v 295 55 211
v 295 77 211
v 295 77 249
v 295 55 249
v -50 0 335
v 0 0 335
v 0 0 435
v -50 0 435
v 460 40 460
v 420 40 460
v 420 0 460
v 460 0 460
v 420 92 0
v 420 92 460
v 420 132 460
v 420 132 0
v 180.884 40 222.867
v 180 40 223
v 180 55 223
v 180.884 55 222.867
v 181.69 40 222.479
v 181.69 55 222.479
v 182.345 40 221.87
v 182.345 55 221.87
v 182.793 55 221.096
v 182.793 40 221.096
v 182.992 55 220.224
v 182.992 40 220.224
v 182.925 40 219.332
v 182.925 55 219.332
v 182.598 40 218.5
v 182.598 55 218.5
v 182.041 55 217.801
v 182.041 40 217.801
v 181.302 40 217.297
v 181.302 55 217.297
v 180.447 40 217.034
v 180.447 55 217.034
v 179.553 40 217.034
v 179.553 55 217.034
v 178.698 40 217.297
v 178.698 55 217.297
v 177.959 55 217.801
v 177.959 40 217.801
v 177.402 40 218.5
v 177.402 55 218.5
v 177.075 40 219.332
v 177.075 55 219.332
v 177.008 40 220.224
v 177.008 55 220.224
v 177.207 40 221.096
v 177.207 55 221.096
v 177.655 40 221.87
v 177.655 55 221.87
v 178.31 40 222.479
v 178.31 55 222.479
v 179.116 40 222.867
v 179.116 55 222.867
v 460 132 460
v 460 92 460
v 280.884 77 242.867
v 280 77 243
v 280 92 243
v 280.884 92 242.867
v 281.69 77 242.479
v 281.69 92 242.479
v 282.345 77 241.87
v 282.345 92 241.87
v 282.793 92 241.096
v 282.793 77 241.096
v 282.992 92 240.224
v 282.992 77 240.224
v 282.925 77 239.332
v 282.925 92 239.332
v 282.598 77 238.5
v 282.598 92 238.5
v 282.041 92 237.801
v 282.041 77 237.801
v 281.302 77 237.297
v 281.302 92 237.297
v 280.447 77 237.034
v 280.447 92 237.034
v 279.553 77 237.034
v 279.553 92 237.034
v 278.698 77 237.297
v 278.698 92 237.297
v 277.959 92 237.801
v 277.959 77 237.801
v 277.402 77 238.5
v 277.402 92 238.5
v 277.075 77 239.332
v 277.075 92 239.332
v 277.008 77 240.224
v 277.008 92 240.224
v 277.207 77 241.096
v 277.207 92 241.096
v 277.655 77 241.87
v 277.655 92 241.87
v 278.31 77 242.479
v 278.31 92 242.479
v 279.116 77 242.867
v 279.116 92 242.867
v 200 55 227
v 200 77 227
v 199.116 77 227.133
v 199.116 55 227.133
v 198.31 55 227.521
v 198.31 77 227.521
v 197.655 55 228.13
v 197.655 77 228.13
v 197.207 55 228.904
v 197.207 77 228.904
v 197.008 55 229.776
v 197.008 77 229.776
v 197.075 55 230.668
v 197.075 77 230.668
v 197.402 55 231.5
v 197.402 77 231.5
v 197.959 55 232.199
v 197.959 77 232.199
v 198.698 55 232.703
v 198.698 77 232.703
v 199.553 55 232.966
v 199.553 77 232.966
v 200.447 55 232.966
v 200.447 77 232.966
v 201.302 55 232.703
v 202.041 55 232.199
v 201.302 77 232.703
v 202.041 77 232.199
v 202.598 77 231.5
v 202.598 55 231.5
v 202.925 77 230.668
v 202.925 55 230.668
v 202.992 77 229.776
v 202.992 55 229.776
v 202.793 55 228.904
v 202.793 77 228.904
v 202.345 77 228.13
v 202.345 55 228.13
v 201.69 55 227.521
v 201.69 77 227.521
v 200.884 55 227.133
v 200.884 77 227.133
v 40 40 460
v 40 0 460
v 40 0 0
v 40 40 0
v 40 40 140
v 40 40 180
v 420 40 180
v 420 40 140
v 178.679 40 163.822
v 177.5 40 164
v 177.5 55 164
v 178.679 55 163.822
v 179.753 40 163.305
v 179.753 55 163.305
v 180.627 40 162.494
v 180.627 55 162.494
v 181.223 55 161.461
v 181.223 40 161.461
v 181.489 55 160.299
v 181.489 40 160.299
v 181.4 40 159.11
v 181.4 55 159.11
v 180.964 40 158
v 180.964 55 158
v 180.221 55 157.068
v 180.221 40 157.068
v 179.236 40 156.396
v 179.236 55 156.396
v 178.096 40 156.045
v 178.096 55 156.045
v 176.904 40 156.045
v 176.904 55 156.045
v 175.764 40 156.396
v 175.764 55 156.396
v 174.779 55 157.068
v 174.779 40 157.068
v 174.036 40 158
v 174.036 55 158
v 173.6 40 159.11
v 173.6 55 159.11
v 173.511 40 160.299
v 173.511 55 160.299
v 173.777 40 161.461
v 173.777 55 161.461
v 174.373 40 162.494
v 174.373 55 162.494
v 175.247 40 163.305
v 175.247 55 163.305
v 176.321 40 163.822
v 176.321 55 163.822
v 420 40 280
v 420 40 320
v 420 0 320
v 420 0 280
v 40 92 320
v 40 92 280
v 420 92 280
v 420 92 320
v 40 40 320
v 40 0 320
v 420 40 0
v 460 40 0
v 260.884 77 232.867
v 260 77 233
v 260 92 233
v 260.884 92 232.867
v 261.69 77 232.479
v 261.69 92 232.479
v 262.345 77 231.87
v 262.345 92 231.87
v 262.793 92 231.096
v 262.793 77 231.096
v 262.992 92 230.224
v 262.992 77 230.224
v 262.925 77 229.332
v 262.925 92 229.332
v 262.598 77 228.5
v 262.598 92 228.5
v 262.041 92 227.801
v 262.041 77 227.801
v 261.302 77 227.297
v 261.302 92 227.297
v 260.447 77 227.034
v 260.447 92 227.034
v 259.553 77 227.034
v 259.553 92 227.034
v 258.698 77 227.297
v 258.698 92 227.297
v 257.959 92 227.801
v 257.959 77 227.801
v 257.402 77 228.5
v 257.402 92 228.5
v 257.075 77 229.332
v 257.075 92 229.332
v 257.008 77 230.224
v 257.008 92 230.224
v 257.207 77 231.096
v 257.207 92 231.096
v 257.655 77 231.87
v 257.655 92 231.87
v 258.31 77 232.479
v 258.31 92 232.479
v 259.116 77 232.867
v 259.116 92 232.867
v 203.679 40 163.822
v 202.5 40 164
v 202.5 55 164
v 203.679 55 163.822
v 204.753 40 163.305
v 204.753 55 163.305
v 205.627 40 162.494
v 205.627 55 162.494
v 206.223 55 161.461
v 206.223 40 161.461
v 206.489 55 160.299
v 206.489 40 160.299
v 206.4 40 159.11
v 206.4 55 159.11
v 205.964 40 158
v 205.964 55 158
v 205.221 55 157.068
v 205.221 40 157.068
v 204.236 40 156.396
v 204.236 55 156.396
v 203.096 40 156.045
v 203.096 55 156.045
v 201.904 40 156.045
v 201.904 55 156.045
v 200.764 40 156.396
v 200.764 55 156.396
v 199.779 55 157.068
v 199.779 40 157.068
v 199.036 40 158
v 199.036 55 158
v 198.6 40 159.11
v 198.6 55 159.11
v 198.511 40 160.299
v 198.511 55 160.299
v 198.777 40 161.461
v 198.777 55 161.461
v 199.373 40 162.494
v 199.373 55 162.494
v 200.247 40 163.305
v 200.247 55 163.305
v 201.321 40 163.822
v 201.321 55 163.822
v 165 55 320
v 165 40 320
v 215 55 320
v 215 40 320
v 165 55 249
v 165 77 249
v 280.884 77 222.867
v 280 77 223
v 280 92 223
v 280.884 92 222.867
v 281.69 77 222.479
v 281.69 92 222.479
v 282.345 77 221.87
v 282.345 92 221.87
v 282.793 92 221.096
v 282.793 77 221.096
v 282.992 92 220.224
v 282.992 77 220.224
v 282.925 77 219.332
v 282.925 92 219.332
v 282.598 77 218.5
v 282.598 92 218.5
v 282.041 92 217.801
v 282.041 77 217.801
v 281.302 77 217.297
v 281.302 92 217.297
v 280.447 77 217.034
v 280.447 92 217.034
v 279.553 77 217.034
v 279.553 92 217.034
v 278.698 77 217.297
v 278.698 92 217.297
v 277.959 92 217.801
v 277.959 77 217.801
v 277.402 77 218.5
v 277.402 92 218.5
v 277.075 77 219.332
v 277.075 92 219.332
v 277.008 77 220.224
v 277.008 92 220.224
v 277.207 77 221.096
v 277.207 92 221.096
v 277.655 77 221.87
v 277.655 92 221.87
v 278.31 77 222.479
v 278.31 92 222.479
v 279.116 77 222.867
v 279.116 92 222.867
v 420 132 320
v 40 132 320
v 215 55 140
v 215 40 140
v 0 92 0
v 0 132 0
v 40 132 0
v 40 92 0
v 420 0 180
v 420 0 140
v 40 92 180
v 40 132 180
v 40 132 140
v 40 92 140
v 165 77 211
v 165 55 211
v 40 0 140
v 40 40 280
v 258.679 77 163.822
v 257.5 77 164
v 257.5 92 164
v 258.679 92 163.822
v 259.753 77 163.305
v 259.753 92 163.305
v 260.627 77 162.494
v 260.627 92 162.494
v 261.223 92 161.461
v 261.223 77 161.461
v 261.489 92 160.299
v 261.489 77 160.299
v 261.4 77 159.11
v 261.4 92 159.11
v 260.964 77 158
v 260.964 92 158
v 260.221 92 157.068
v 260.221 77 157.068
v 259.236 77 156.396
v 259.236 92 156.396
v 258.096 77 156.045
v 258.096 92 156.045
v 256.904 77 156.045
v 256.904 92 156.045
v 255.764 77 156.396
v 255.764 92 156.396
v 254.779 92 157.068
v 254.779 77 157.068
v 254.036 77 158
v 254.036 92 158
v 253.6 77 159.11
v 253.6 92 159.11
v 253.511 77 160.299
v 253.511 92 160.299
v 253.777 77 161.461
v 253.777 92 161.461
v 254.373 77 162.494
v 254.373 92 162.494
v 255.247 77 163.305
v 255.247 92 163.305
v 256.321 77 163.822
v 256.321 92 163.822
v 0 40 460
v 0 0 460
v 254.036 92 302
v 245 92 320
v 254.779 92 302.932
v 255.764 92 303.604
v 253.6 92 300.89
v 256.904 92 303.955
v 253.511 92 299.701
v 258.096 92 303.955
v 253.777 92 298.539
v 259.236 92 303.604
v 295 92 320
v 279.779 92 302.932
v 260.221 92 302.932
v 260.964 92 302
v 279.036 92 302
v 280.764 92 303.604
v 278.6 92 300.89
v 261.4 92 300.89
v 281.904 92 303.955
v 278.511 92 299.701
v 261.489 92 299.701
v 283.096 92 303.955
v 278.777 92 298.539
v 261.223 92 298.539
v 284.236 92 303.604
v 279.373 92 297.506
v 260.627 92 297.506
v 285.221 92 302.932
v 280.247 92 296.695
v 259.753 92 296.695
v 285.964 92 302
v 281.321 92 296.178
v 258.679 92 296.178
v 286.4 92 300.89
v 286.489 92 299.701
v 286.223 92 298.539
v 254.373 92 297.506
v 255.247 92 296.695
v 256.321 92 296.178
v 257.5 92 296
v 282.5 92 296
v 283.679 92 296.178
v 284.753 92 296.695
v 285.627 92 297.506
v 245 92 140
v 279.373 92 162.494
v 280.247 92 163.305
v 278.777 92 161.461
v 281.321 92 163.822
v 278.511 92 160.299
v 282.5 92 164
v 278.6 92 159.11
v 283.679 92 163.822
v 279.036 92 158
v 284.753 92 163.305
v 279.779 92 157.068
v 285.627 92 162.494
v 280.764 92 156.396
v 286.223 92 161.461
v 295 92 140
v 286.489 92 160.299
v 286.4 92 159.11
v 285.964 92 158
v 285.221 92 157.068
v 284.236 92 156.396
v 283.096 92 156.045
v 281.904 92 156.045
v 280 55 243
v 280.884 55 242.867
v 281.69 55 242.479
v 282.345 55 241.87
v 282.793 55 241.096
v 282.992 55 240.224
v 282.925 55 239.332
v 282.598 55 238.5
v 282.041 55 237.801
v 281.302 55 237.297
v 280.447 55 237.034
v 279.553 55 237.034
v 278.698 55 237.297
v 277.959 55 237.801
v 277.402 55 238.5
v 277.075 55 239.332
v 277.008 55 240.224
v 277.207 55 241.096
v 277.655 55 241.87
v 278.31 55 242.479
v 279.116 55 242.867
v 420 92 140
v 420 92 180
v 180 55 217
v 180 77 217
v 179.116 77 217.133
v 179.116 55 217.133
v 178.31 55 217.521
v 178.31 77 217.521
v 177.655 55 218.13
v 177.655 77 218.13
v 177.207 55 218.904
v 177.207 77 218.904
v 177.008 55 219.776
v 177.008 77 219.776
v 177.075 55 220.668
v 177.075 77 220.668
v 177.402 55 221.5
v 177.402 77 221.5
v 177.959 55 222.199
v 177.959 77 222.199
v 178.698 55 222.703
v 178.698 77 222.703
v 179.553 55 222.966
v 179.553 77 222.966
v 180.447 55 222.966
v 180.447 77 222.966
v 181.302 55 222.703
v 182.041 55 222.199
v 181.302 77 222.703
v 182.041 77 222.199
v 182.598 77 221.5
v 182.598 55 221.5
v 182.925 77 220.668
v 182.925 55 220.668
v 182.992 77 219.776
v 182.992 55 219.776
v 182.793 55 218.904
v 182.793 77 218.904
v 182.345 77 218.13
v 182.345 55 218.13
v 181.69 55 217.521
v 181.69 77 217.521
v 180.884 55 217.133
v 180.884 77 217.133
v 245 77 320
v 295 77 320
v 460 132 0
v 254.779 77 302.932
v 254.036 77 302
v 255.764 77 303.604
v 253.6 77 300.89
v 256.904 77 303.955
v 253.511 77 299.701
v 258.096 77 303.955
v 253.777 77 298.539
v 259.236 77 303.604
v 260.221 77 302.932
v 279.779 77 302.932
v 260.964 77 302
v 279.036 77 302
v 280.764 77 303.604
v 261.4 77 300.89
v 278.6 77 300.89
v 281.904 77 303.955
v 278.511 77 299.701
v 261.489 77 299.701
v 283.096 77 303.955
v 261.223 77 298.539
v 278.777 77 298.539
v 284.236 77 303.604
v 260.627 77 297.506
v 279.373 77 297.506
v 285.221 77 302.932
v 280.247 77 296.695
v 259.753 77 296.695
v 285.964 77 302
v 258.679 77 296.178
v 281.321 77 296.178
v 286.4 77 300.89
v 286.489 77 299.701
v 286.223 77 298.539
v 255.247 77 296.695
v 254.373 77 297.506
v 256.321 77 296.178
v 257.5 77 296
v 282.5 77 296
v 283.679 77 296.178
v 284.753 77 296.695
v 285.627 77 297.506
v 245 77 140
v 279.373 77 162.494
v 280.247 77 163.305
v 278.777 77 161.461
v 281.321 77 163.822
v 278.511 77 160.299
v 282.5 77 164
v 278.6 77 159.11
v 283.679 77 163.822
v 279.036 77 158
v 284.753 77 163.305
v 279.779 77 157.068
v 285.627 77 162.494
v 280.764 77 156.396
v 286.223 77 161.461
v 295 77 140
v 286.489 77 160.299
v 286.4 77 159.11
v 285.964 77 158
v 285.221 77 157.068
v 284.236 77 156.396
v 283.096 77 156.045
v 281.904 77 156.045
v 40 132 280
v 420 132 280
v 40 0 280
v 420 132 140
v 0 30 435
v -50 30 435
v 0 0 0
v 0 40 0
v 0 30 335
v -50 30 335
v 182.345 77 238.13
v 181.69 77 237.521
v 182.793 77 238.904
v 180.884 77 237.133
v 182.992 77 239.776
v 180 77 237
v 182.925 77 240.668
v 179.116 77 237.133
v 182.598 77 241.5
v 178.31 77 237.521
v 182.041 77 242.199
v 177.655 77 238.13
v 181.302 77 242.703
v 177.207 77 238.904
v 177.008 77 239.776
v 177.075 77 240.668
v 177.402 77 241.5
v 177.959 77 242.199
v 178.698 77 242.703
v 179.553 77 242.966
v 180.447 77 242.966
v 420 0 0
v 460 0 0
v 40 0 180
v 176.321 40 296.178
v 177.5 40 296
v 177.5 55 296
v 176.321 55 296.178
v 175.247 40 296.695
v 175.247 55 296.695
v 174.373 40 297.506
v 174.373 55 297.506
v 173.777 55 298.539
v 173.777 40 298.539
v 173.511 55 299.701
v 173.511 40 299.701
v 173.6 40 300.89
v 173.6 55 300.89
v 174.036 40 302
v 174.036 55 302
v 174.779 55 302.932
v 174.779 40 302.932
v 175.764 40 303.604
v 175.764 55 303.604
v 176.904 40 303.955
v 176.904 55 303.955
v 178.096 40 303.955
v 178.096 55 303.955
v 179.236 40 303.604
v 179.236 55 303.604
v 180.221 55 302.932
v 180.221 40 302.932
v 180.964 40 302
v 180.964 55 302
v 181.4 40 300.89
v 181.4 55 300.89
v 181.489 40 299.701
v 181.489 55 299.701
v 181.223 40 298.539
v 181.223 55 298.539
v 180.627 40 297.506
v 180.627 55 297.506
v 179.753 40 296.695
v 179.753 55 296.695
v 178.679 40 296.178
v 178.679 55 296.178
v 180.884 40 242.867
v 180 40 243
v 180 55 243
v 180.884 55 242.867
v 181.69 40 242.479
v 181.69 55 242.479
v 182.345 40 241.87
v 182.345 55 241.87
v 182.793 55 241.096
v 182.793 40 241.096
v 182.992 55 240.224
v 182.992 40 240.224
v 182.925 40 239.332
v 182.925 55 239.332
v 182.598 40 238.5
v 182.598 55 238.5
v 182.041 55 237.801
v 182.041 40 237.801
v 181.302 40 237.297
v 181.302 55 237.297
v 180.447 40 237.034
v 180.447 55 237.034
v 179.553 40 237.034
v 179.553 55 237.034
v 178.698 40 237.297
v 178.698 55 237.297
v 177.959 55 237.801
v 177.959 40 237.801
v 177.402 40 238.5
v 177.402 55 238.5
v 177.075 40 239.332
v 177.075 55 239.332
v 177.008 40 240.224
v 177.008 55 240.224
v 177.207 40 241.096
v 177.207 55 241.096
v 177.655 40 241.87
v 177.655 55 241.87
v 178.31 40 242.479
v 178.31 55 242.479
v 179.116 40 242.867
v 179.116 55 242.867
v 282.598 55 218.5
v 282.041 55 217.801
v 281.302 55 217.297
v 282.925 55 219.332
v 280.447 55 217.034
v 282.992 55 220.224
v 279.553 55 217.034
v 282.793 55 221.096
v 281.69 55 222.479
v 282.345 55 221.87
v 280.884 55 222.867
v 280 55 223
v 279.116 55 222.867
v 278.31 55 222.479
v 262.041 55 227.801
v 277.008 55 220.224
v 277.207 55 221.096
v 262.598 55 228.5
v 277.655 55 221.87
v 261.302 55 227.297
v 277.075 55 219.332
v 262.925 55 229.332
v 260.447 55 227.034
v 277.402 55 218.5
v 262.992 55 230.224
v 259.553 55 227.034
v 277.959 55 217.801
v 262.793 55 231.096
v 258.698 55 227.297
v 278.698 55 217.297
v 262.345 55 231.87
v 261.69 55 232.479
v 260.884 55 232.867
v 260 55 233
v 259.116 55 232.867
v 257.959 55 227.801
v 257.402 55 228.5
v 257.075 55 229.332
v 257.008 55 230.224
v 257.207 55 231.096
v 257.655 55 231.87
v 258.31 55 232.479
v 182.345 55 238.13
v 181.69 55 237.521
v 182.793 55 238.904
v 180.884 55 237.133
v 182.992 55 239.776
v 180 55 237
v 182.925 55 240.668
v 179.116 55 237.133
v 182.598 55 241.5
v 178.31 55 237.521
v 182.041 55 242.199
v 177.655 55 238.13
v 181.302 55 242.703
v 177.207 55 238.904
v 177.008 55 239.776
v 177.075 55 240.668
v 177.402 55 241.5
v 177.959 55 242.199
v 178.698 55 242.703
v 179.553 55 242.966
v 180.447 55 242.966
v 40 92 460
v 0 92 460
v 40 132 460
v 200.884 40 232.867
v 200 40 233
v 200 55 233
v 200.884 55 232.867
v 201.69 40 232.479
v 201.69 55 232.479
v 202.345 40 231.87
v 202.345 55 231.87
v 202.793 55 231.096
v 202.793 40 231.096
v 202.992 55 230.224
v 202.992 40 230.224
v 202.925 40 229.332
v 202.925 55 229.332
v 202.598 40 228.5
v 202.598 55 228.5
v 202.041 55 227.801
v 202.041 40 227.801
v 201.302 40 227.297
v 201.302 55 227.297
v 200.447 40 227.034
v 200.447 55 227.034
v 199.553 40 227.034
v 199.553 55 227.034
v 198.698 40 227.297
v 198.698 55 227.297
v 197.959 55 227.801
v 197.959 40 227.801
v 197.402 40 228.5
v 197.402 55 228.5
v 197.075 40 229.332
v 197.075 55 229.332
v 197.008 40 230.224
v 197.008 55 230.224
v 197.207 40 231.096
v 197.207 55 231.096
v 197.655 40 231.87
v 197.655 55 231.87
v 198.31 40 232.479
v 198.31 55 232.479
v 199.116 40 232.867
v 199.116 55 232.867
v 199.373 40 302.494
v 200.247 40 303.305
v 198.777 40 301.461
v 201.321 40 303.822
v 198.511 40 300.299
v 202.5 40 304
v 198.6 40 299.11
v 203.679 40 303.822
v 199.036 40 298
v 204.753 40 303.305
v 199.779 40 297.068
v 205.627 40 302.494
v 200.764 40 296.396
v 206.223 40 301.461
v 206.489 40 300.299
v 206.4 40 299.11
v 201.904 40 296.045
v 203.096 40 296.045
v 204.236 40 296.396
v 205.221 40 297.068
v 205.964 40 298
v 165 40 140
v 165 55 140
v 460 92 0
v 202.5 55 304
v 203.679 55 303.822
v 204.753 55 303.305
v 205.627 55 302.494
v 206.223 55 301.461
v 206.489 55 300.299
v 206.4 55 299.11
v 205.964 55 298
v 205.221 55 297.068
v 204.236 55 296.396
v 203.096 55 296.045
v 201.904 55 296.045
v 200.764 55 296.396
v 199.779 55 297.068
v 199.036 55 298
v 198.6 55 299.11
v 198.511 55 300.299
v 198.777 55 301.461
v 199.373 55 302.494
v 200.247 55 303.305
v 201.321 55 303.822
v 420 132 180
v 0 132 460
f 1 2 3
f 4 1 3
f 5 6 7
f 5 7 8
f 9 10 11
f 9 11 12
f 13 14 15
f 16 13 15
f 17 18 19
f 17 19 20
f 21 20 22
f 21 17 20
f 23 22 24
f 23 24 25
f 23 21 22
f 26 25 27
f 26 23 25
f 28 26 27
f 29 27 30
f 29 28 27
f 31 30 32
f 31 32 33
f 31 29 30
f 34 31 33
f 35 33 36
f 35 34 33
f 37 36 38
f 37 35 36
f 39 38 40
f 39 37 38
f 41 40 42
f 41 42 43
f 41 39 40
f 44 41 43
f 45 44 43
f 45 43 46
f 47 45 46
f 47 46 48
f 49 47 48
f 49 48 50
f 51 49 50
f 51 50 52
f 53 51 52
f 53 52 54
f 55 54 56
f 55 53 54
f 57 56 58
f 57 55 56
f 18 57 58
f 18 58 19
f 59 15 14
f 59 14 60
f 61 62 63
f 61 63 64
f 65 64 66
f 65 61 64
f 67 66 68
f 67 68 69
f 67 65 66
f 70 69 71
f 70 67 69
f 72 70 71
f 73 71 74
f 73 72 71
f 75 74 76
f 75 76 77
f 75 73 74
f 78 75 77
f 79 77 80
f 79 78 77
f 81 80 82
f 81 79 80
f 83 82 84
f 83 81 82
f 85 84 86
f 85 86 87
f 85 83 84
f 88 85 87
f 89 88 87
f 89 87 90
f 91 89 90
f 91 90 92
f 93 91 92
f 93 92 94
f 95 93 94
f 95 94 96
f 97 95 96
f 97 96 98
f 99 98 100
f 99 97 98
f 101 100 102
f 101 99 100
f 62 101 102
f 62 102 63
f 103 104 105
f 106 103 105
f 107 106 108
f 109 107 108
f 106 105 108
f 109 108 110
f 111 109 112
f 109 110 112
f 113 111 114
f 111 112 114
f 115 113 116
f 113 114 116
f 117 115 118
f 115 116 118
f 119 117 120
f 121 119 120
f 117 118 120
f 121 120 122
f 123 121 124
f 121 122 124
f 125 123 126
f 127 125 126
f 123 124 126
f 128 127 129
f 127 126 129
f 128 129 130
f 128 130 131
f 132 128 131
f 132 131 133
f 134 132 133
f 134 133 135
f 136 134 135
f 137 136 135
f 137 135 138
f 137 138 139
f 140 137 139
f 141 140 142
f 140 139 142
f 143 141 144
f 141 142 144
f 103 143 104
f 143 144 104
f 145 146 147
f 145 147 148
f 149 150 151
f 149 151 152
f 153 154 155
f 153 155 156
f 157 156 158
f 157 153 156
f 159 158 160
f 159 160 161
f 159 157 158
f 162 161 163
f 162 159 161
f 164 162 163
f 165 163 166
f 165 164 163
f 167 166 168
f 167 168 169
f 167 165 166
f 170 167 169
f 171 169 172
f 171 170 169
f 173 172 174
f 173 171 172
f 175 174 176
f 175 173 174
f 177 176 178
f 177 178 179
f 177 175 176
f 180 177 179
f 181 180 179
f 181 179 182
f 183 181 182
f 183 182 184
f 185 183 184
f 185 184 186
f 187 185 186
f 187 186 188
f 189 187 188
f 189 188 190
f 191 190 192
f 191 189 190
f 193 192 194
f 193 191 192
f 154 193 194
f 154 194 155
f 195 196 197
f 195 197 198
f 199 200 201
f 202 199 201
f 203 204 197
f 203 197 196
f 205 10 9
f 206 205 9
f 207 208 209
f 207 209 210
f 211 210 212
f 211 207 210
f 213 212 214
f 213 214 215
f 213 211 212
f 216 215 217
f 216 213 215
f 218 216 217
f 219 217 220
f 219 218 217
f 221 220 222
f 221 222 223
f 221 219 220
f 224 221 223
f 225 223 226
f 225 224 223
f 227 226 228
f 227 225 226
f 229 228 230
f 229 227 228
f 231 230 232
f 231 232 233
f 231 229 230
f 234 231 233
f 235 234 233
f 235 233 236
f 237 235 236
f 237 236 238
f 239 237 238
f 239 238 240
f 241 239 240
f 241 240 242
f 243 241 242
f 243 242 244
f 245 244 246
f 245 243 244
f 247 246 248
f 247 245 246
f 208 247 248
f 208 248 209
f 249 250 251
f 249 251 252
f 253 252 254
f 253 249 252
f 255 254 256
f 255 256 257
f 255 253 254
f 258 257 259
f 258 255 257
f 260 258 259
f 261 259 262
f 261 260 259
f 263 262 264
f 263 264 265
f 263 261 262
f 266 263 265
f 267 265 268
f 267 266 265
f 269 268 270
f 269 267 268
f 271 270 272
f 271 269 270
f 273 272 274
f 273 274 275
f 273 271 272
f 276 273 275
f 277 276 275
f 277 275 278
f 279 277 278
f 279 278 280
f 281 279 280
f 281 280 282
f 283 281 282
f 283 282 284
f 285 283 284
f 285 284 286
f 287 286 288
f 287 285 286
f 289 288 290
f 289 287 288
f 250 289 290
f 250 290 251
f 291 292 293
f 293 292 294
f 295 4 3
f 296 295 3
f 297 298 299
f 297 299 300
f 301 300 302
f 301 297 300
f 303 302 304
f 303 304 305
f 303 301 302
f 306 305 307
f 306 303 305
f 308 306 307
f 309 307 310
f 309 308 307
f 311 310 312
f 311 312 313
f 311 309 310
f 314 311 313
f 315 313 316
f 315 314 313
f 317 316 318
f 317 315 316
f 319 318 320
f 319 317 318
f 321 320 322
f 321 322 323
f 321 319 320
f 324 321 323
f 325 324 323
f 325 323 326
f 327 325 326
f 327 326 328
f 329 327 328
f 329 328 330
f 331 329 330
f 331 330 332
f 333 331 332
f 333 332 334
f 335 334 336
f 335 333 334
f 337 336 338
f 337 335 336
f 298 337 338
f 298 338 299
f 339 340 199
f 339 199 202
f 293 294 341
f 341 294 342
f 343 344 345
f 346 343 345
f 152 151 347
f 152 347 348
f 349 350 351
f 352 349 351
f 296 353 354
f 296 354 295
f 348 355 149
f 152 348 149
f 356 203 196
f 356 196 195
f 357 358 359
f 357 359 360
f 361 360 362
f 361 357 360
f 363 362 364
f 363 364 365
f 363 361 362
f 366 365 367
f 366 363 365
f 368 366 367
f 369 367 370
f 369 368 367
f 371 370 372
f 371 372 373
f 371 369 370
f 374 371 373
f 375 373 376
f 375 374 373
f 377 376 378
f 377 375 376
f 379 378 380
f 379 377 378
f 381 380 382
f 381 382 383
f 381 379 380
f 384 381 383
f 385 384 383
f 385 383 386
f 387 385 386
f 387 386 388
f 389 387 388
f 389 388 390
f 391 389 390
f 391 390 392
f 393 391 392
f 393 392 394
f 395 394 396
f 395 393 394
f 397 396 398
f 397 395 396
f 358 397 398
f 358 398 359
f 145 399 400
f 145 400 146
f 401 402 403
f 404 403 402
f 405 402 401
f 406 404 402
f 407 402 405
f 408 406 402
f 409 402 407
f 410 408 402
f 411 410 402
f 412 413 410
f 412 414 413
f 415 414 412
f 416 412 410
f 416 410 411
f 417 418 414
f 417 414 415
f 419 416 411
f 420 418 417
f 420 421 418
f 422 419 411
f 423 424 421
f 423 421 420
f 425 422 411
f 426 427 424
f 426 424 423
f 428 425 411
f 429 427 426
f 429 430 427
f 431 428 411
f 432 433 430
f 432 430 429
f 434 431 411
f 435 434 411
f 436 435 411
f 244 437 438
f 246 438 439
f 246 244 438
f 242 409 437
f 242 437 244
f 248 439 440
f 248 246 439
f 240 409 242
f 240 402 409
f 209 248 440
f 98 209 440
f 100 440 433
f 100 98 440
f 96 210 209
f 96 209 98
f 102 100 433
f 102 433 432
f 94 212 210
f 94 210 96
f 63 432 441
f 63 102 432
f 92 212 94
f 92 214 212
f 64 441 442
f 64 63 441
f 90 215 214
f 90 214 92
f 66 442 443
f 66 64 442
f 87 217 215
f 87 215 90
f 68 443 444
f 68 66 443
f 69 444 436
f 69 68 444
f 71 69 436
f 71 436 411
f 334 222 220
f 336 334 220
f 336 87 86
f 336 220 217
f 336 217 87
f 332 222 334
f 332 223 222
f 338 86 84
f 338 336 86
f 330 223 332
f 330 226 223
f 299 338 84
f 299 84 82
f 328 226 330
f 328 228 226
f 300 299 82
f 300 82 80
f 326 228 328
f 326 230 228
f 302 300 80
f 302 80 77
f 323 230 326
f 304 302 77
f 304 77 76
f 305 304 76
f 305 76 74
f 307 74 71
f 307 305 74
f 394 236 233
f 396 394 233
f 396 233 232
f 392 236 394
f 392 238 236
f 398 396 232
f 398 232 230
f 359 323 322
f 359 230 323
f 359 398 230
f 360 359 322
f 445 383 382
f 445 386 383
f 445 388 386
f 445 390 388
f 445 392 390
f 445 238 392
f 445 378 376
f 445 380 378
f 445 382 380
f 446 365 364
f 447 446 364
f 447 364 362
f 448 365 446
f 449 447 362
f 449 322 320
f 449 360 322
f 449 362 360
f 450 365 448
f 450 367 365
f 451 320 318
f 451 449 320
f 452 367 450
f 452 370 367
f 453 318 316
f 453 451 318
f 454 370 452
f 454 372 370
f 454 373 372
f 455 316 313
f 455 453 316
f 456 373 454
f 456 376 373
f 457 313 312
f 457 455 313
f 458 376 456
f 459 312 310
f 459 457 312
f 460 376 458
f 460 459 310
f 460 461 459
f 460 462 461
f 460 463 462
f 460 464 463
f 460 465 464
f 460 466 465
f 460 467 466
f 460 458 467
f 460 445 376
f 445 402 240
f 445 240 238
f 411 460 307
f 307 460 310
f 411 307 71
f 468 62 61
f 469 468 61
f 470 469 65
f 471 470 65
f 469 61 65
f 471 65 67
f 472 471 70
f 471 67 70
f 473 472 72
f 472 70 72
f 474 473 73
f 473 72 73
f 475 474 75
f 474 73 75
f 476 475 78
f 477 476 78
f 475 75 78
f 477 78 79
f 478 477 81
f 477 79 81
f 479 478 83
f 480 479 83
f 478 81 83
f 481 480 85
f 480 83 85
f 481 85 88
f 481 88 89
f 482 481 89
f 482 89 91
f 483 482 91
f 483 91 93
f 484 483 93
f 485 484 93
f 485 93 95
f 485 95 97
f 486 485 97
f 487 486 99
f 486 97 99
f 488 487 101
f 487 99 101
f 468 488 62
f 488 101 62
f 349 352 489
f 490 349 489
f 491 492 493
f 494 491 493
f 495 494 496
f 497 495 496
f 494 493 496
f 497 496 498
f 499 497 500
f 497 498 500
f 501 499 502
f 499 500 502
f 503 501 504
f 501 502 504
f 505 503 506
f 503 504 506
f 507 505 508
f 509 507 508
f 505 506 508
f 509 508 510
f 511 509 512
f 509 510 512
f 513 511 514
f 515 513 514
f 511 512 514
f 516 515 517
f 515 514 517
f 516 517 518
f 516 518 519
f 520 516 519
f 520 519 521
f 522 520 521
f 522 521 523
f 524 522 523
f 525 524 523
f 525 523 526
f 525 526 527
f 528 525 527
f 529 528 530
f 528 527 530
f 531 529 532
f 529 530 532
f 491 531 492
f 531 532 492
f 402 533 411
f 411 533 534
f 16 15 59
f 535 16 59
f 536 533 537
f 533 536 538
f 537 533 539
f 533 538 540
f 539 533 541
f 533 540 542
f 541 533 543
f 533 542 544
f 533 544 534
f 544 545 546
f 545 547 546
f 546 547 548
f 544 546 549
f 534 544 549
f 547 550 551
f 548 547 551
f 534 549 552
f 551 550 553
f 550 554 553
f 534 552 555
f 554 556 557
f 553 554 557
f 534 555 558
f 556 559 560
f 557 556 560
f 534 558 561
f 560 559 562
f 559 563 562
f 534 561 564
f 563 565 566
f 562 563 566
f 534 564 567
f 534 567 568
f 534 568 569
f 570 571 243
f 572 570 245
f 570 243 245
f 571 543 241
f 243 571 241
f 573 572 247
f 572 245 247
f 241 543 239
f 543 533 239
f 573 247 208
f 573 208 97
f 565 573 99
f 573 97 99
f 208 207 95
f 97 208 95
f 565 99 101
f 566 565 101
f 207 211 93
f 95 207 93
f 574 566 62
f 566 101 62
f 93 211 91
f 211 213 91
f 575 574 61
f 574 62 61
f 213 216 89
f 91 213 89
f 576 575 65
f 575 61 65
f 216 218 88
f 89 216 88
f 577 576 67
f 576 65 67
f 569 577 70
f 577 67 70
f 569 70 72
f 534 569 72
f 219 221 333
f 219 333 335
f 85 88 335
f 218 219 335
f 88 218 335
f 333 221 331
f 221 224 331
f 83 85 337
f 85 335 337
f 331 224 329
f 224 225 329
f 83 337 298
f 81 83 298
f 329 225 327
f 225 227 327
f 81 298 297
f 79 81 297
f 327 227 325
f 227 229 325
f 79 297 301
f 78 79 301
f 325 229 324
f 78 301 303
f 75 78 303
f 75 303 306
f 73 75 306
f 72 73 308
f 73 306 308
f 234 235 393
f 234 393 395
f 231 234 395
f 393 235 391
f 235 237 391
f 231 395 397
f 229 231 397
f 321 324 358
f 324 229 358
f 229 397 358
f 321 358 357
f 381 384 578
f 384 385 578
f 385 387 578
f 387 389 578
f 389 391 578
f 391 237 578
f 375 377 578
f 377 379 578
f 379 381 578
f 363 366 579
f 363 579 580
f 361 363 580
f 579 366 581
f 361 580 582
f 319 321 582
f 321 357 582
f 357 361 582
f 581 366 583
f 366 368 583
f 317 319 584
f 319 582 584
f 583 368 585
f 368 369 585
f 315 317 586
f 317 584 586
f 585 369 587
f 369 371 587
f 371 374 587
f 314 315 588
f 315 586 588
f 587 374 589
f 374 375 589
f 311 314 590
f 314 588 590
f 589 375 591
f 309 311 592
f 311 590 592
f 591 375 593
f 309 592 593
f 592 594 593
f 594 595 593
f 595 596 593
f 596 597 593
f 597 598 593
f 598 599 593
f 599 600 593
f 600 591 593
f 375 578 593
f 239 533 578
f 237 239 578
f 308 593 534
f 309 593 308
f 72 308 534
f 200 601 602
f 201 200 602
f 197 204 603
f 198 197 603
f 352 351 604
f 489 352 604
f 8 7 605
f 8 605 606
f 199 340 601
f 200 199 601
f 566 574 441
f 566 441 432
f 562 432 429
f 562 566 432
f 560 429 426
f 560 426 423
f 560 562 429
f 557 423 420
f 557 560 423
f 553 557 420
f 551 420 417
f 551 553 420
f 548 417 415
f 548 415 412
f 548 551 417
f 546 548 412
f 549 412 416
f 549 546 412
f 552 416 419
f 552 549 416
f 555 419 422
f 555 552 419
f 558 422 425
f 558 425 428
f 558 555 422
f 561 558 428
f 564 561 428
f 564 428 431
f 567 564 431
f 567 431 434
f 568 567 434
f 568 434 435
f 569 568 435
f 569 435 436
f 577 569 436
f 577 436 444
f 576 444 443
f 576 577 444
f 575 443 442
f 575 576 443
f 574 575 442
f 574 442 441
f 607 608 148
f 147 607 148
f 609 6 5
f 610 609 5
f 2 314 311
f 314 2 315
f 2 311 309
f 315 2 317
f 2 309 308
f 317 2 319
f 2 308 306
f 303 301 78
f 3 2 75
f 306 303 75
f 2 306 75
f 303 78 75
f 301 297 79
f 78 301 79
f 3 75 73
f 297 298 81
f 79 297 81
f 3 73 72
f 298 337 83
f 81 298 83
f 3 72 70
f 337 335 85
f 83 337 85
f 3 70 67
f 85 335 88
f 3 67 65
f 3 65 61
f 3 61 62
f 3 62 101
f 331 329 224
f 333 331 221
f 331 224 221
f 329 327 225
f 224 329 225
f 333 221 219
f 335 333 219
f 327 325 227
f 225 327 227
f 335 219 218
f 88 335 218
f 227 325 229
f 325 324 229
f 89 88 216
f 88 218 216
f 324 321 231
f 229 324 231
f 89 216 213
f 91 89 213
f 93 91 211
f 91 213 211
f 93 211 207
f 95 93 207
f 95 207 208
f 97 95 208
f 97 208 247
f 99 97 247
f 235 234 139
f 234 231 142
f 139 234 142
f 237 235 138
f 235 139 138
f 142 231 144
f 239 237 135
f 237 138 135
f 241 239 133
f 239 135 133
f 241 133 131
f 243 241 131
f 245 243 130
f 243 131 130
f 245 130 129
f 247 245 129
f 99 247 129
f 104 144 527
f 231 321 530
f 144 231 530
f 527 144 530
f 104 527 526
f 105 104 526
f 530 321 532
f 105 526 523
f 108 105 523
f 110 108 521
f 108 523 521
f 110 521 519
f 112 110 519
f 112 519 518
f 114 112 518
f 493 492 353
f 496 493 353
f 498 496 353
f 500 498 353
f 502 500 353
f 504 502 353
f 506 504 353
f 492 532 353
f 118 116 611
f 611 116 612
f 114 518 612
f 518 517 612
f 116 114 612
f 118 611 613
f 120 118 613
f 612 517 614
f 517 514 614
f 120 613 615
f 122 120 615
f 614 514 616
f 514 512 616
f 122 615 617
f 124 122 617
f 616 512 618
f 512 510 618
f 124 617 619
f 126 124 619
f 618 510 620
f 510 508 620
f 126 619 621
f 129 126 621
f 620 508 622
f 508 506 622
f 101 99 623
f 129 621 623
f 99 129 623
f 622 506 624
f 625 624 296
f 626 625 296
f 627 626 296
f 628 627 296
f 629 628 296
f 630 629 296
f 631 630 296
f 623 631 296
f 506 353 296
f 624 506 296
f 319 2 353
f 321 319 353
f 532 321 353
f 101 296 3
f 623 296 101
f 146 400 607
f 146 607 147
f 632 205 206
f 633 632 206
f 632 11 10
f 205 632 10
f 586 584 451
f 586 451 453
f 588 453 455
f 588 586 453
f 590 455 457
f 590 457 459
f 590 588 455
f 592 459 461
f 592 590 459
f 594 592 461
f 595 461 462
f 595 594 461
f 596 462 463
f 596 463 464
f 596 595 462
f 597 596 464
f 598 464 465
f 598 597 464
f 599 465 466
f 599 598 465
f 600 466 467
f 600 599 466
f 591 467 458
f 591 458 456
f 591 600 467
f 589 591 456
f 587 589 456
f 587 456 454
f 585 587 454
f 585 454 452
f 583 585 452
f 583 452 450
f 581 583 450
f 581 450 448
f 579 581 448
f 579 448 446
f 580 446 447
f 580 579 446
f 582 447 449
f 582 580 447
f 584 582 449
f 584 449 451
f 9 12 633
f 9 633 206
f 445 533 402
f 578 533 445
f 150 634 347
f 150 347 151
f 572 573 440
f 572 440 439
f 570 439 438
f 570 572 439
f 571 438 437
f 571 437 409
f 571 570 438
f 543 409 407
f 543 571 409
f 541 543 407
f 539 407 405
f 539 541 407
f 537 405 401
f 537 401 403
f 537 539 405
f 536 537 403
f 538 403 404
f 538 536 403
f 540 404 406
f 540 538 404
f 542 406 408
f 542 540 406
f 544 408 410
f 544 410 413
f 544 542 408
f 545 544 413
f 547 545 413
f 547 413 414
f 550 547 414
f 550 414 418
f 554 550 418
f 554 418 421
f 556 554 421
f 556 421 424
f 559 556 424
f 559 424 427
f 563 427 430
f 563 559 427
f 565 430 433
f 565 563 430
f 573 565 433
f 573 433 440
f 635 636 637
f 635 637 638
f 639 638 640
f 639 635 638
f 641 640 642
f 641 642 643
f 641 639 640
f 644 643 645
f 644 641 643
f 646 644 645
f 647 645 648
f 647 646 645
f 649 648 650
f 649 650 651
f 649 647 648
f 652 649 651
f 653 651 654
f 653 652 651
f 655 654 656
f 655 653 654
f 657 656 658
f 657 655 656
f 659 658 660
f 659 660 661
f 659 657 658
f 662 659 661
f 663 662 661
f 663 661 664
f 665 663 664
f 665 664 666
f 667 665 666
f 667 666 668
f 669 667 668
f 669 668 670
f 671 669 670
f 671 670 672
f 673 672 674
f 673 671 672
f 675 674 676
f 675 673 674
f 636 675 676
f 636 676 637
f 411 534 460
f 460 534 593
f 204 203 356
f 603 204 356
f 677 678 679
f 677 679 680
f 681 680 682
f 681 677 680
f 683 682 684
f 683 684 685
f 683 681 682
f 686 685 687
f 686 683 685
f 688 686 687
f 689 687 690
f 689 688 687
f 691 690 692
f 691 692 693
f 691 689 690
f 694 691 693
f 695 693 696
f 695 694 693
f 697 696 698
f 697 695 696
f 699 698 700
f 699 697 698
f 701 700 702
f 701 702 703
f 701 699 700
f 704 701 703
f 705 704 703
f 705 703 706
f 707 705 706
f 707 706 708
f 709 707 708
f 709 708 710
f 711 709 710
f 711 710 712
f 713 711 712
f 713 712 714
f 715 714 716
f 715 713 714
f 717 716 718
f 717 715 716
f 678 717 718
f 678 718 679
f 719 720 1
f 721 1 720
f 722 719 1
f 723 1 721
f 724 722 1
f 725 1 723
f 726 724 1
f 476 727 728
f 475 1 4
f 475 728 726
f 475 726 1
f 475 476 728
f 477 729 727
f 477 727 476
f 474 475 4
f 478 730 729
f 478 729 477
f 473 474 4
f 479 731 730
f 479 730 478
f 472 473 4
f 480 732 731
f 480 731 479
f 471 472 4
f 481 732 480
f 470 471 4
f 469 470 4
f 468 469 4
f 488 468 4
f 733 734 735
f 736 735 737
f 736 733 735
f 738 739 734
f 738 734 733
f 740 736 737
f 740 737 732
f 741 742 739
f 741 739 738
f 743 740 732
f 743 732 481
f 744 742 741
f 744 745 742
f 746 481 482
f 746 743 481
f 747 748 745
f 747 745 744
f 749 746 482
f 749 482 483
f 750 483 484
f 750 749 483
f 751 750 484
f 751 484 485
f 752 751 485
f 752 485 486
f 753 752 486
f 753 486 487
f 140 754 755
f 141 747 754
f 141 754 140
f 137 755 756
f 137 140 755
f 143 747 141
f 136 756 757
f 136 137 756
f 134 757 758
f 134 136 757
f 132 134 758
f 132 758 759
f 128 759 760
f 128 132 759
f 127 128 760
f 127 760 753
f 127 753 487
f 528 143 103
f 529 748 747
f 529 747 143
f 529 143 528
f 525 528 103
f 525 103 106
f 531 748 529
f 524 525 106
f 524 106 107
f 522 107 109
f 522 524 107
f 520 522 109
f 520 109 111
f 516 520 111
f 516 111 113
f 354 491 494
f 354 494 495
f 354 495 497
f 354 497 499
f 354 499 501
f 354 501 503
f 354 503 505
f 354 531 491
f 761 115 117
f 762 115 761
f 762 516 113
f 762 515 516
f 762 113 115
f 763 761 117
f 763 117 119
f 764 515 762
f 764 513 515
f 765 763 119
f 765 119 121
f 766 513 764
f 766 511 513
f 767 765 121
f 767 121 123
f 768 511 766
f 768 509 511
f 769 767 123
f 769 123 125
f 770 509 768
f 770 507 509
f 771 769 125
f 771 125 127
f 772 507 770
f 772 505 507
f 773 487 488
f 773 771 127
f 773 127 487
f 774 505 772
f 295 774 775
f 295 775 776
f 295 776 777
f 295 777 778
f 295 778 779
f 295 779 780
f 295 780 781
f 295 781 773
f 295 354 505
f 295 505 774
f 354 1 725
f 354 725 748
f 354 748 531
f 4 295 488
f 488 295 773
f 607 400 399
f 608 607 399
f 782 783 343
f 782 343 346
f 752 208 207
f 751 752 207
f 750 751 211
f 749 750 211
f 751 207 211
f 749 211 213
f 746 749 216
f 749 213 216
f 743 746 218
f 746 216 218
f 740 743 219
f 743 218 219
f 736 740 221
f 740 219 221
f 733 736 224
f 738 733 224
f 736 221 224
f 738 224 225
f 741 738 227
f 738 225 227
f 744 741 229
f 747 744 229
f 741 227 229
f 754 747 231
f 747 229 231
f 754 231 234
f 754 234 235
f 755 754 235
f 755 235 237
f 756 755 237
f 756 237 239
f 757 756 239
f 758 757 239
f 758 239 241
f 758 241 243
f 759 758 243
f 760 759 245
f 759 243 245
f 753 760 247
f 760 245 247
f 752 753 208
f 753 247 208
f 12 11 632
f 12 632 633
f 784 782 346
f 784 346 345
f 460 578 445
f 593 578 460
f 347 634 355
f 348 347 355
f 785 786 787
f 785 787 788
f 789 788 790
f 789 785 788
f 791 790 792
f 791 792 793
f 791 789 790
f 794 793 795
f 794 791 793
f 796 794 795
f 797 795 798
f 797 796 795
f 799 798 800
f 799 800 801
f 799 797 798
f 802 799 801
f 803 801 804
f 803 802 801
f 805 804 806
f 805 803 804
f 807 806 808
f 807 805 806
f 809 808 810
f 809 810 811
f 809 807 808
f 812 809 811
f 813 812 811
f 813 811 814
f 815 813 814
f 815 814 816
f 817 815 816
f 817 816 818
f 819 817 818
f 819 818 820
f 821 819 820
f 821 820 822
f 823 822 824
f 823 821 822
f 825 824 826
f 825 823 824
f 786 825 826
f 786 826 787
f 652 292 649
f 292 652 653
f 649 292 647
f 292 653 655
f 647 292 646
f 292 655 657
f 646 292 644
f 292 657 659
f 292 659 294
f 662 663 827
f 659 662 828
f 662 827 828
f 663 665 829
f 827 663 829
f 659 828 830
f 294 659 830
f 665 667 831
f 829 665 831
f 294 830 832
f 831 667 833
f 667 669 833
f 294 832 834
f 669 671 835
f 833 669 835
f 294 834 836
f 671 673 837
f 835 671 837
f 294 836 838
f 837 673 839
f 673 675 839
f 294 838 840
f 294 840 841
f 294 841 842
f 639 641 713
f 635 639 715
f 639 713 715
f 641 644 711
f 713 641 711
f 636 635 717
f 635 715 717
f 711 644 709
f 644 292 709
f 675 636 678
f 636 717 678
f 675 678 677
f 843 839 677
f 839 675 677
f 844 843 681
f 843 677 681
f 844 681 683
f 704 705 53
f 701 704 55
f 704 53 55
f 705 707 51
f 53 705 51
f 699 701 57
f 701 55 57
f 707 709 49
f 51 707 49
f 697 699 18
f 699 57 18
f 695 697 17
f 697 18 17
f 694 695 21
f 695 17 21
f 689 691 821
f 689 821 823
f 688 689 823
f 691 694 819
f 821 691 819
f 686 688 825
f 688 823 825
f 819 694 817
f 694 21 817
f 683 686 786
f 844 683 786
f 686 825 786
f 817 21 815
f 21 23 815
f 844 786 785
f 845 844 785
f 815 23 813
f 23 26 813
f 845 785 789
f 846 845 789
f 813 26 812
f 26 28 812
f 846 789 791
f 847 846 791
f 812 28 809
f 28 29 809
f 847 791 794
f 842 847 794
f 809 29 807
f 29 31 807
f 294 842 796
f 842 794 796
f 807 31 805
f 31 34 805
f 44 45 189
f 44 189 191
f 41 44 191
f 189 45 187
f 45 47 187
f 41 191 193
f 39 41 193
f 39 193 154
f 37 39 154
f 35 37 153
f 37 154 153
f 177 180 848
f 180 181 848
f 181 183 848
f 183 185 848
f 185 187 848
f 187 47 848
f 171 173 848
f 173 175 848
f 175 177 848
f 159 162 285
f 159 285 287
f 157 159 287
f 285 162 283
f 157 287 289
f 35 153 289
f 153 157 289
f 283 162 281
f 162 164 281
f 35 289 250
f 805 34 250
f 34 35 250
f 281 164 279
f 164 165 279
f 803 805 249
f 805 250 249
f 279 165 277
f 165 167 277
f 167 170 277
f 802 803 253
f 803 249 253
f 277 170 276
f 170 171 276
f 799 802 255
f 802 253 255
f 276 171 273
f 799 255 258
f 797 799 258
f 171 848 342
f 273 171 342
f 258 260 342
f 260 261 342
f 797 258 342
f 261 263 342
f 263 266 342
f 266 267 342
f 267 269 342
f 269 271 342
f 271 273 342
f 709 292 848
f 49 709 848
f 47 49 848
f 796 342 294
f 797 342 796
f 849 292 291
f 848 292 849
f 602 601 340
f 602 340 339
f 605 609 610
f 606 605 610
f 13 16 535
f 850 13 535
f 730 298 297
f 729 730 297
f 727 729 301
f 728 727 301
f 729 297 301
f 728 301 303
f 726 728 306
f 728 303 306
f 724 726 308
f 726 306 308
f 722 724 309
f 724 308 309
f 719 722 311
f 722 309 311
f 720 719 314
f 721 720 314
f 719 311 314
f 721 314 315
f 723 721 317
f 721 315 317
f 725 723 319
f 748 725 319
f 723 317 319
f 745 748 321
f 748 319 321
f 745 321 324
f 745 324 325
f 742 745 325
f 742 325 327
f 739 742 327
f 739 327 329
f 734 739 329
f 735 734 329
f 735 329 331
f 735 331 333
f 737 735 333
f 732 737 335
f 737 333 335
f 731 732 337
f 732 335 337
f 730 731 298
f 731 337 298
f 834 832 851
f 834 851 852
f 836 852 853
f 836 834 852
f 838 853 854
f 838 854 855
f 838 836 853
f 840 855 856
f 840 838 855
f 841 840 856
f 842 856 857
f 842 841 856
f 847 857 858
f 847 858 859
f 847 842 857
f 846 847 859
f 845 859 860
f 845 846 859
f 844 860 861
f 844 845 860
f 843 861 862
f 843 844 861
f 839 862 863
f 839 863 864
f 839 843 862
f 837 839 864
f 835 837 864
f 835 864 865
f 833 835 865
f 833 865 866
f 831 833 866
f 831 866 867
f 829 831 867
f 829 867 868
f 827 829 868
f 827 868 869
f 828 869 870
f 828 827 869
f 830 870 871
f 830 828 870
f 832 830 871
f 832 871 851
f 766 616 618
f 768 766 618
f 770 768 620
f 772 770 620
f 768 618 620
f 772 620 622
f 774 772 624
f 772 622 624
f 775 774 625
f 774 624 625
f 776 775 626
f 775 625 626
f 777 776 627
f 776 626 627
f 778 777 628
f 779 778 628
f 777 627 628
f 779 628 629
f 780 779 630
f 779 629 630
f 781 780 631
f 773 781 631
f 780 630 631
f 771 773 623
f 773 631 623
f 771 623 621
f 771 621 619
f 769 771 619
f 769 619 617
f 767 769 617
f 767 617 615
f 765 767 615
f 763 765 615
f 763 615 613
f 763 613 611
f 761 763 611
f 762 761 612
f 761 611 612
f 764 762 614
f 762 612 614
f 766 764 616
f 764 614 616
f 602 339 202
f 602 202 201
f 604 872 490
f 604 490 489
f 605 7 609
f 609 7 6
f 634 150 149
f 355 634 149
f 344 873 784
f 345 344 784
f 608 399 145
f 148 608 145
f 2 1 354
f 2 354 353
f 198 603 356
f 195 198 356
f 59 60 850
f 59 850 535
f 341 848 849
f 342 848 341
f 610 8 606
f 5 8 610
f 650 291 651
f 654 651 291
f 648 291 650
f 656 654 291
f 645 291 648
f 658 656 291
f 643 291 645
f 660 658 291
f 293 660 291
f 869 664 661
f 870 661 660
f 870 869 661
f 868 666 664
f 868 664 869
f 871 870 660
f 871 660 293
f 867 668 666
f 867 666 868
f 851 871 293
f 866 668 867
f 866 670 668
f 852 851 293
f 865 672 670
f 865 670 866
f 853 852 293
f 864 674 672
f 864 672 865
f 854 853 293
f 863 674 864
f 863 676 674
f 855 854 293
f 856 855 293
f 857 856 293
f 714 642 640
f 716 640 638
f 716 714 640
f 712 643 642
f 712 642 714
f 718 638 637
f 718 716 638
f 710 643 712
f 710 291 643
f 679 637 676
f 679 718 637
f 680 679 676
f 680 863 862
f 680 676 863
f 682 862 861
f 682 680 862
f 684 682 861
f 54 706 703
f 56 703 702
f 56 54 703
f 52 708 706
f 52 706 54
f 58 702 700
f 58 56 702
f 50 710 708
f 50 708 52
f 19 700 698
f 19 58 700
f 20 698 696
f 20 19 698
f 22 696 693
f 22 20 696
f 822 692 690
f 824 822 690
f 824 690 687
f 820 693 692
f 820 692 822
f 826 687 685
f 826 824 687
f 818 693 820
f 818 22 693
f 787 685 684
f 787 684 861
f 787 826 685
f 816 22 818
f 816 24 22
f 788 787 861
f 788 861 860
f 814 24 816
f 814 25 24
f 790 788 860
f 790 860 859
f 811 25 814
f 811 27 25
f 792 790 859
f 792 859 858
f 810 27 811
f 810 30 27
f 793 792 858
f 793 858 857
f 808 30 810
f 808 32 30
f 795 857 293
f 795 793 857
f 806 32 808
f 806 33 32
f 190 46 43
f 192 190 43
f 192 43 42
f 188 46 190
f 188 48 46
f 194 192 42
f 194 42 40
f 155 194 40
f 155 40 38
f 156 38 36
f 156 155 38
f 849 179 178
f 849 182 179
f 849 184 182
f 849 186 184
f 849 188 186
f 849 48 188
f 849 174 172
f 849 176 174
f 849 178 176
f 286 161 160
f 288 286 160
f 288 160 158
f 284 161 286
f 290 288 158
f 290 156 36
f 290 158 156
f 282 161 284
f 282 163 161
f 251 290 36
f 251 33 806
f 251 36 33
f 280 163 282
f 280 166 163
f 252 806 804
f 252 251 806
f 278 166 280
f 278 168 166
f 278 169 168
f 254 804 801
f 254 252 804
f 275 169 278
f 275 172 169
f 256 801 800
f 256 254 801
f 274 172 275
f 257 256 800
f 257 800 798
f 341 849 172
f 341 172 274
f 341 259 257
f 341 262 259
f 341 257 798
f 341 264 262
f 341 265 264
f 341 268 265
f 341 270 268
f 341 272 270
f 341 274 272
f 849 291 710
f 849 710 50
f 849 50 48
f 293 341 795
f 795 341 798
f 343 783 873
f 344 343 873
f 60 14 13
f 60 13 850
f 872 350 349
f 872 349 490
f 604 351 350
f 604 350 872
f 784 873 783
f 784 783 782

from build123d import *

# Parameters (mm, degrees)
SKETCH1_W             = 40
SKETCH1_H             = 40
BOSS_EXTRUDE1_DEPTH   = 460
SKETCH2_W             = 40
SKETCH2_H             = 40
BOSS_EXTRUDE2_DEPTH   = 380
BOSS_EXTRUDE2_2_DEPTH = 380
SKETCH3_W             = 40
SKETCH3_H             = 40
BOSS_EXTRUDE3_DEPTH   = 460
SKETCH4_W             = 50
SKETCH4_H             = 180
SKETCH4_R             = 4
SKETCH4_R_2           = 3
BOSS_EXTRUDE4_DEPTH   = 15
SKETCH5_W             = 38
SKETCH5_H             = 22
BOSS_EXTRUDE5_DEPTH   = 130
SKETCH6_R             = 3
CUT_EXTRUDE1_DEPTH    = 22
SKETCH7_W             = 50
SKETCH7_H             = 180
SKETCH7_R             = 3
SKETCH7_R_2           = 4
BOSS_EXTRUDE6_DEPTH   = 15
SKETCH8_W             = 40
SKETCH8_H             = 40
BOSS_EXTRUDE7_DEPTH   = 460
BOSS_EXTRUDE7_2_DEPTH = 460
SKETCH9_W             = 380
SKETCH9_H             = 40
BOSS_EXTRUDE8_DEPTH   = 40
BOSS_EXTRUDE8_2_DEPTH = 40
SKETCH11_W            = 50
SKETCH11_H            = 100
BOSS_EXTRUDE10_DEPTH  = 30


with BuildPart() as part:
    # Sketch1 → Boss-Extrude1 (new body)
    with BuildSketch(Plane.XY):
        with Locations((20, 20)):
            Rectangle(SKETCH1_W, SKETCH1_H)
    extrude(amount=BOSS_EXTRUDE1_DEPTH)


with BuildPart() as body_2:
    # Sketch2 → Boss-Extrude2 (new body)
    with BuildSketch(Plane(origin=(40, 0, 0), x_dir=(0, 0, -1), z_dir=(1, 0, 0))):
        with Locations((-300, 20)):
            Rectangle(SKETCH2_W, SKETCH2_H)
    extrude(amount=BOSS_EXTRUDE2_DEPTH)


with BuildPart() as body_3:
    # Sketch2 → Boss-Extrude2 2 (new body)
    with BuildSketch(Plane(origin=(40, 0, 0), x_dir=(0, 0, -1), z_dir=(1, 0, 0))):
        with Locations((-160, 20)):
            Rectangle(SKETCH2_W, SKETCH2_H)
    extrude(amount=BOSS_EXTRUDE2_2_DEPTH)


with BuildPart() as body_4:
    # Sketch3 → Boss-Extrude3 (new body)
    with BuildSketch(Plane.XY):
        with Locations((440, 20)):
            Rectangle(SKETCH3_W, SKETCH3_H)
    extrude(amount=BOSS_EXTRUDE3_DEPTH)


with BuildPart() as body_5:
    # Sketch4 → Boss-Extrude4 (new body)
    with BuildSketch(Plane(origin=(0, 40, 0), x_dir=(1, 0, 0), z_dir=(0, 1, 0))):
        with Locations((190, -230)):
            Rectangle(SKETCH4_W, SKETCH4_H)
        with Locations(Location((177.5, -160, 0), (0, 0, 270))):
            Circle(SKETCH4_R, mode=Mode.SUBTRACT)
        with Locations(Location((202.5, -160, 0), (0, 0, 270))):
            Circle(SKETCH4_R, mode=Mode.SUBTRACT)
        with Locations(Location((202.5, -300, 0), (0, 0, 270))):
            Circle(SKETCH4_R, mode=Mode.SUBTRACT)
        with Locations(Location((177.5, -300, 0), (0, 0, 90))):
            Circle(SKETCH4_R, mode=Mode.SUBTRACT)
        with Locations(Location((180, -220, 0), (0, 0, 270))):
            Circle(SKETCH4_R_2, mode=Mode.SUBTRACT)
        with Locations(Location((180, -240, 0), (0, 0, 270))):
            Circle(SKETCH4_R_2, mode=Mode.SUBTRACT)
        with Locations(Location((200, -230, 0), (0, 0, 270))):
            Circle(SKETCH4_R_2, mode=Mode.SUBTRACT)
    extrude(amount=BOSS_EXTRUDE4_DEPTH)


with BuildPart() as body_6:
    # Sketch5 → Boss-Extrude5 (new body)
    with BuildSketch(Plane.ZY.offset(-165)):
        with Locations((230, 66)):
            Rectangle(SKETCH5_W, SKETCH5_H)
    extrude(amount=-BOSS_EXTRUDE5_DEPTH)

    # Sketch6 → Cut-Extrude1 (cut)
    with BuildSketch(Plane(origin=(0, 77, 0), x_dir=(1, 0, 0), z_dir=(0, 1, 0))):
        with Locations(Location((280, -240, 0), (0, 0, 270))):
            Circle(SKETCH6_R)
        with Locations(Location((260, -230, 0), (0, 0, 270))):
            Circle(SKETCH6_R)
        with Locations(Location((280, -220, 0), (0, 0, 270))):
            Circle(SKETCH6_R)
        with Locations(Location((180, -240, 0), (0, 0, 90))):
            Circle(SKETCH6_R)
        with Locations(Location((180, -220, 0), (0, 0, 90))):
            Circle(SKETCH6_R)
        with Locations(Location((200, -230, 0), (0, 0, 90))):
            Circle(SKETCH6_R)
    extrude(amount=-CUT_EXTRUDE1_DEPTH, mode=Mode.SUBTRACT)


with BuildPart() as body_7:
    # Sketch7 → Boss-Extrude6 (new body)
    with BuildSketch(Plane(origin=(0, 77, 0), x_dir=(1, 0, 0), z_dir=(0, 1, 0))):
        with Locations((270, -230)):
            Rectangle(SKETCH7_W, SKETCH7_H)
        with Locations(Location((260, -230, 0), (0, 0, 270))):
            Circle(SKETCH7_R, mode=Mode.SUBTRACT)
        with Locations(Location((280, -220, 0), (0, 0, 270))):
            Circle(SKETCH7_R, mode=Mode.SUBTRACT)
        with Locations(Location((280, -240, 0), (0, 0, 270))):
            Circle(SKETCH7_R, mode=Mode.SUBTRACT)
        with Locations(Location((257.5, -160, 0), (0, 0, 270))):
            Circle(SKETCH7_R_2, mode=Mode.SUBTRACT)
        with Locations(Location((282.5, -160, 0), (0, 0, 270))):
            Circle(SKETCH7_R_2, mode=Mode.SUBTRACT)
        with Locations(Location((282.5, -300, 0), (0, 0, 90))):
            Circle(SKETCH7_R_2, mode=Mode.SUBTRACT)
        with Locations(Location((257.5, -300, 0), (0, 0, 90))):
            Circle(SKETCH7_R_2, mode=Mode.SUBTRACT)
    extrude(amount=BOSS_EXTRUDE6_DEPTH)


with BuildPart() as body_8:
    # Sketch8 → Boss-Extrude7 (new body)
    with BuildSketch(Plane.XY):
        with Locations((440, 112)):
            Rectangle(SKETCH8_W, SKETCH8_H)
    extrude(amount=BOSS_EXTRUDE7_DEPTH)


with BuildPart() as body_9:
    # Sketch8 → Boss-Extrude7 2 (new body)
    with BuildSketch(Plane.XY):
        with Locations((20, 112)):
            Rectangle(SKETCH8_W, SKETCH8_H)
    extrude(amount=BOSS_EXTRUDE7_2_DEPTH)


with BuildPart() as body_10:
    # Sketch9 → Boss-Extrude8 (new body)
    with BuildSketch(Plane(origin=(0, 132, 0), x_dir=(1, 0, 0), z_dir=(0, 1, 0))):
        with Locations((230, -160)):
            Rectangle(SKETCH9_W, SKETCH9_H)
    extrude(amount=-BOSS_EXTRUDE8_DEPTH)


with BuildPart() as body_11:
    # Sketch9 → Boss-Extrude8 2 (new body)
    with BuildSketch(Plane(origin=(0, 132, 0), x_dir=(1, 0, 0), z_dir=(0, 1, 0))):
        with Locations((230, -300)):
            Rectangle(SKETCH9_W, SKETCH9_H)
    extrude(amount=-BOSS_EXTRUDE8_2_DEPTH)


with BuildPart() as body_12:
    # Sketch11 → Boss-Extrude10 (new body)
    with BuildSketch(Plane(origin=(0, 0, 0), x_dir=(-1, 0, 0), z_dir=(0, -1, 0))):
        with Locations((25, -385)):
            Rectangle(SKETCH11_W, SKETCH11_H)
    extrude(amount=-BOSS_EXTRUDE10_DEPTH)


solid = Compound([part.part, body_2.part, body_3.part, body_4.part, body_5.part, body_6.part, body_7.part, body_8.part, body_9.part, body_10.part, body_11.part, body_12.part])
